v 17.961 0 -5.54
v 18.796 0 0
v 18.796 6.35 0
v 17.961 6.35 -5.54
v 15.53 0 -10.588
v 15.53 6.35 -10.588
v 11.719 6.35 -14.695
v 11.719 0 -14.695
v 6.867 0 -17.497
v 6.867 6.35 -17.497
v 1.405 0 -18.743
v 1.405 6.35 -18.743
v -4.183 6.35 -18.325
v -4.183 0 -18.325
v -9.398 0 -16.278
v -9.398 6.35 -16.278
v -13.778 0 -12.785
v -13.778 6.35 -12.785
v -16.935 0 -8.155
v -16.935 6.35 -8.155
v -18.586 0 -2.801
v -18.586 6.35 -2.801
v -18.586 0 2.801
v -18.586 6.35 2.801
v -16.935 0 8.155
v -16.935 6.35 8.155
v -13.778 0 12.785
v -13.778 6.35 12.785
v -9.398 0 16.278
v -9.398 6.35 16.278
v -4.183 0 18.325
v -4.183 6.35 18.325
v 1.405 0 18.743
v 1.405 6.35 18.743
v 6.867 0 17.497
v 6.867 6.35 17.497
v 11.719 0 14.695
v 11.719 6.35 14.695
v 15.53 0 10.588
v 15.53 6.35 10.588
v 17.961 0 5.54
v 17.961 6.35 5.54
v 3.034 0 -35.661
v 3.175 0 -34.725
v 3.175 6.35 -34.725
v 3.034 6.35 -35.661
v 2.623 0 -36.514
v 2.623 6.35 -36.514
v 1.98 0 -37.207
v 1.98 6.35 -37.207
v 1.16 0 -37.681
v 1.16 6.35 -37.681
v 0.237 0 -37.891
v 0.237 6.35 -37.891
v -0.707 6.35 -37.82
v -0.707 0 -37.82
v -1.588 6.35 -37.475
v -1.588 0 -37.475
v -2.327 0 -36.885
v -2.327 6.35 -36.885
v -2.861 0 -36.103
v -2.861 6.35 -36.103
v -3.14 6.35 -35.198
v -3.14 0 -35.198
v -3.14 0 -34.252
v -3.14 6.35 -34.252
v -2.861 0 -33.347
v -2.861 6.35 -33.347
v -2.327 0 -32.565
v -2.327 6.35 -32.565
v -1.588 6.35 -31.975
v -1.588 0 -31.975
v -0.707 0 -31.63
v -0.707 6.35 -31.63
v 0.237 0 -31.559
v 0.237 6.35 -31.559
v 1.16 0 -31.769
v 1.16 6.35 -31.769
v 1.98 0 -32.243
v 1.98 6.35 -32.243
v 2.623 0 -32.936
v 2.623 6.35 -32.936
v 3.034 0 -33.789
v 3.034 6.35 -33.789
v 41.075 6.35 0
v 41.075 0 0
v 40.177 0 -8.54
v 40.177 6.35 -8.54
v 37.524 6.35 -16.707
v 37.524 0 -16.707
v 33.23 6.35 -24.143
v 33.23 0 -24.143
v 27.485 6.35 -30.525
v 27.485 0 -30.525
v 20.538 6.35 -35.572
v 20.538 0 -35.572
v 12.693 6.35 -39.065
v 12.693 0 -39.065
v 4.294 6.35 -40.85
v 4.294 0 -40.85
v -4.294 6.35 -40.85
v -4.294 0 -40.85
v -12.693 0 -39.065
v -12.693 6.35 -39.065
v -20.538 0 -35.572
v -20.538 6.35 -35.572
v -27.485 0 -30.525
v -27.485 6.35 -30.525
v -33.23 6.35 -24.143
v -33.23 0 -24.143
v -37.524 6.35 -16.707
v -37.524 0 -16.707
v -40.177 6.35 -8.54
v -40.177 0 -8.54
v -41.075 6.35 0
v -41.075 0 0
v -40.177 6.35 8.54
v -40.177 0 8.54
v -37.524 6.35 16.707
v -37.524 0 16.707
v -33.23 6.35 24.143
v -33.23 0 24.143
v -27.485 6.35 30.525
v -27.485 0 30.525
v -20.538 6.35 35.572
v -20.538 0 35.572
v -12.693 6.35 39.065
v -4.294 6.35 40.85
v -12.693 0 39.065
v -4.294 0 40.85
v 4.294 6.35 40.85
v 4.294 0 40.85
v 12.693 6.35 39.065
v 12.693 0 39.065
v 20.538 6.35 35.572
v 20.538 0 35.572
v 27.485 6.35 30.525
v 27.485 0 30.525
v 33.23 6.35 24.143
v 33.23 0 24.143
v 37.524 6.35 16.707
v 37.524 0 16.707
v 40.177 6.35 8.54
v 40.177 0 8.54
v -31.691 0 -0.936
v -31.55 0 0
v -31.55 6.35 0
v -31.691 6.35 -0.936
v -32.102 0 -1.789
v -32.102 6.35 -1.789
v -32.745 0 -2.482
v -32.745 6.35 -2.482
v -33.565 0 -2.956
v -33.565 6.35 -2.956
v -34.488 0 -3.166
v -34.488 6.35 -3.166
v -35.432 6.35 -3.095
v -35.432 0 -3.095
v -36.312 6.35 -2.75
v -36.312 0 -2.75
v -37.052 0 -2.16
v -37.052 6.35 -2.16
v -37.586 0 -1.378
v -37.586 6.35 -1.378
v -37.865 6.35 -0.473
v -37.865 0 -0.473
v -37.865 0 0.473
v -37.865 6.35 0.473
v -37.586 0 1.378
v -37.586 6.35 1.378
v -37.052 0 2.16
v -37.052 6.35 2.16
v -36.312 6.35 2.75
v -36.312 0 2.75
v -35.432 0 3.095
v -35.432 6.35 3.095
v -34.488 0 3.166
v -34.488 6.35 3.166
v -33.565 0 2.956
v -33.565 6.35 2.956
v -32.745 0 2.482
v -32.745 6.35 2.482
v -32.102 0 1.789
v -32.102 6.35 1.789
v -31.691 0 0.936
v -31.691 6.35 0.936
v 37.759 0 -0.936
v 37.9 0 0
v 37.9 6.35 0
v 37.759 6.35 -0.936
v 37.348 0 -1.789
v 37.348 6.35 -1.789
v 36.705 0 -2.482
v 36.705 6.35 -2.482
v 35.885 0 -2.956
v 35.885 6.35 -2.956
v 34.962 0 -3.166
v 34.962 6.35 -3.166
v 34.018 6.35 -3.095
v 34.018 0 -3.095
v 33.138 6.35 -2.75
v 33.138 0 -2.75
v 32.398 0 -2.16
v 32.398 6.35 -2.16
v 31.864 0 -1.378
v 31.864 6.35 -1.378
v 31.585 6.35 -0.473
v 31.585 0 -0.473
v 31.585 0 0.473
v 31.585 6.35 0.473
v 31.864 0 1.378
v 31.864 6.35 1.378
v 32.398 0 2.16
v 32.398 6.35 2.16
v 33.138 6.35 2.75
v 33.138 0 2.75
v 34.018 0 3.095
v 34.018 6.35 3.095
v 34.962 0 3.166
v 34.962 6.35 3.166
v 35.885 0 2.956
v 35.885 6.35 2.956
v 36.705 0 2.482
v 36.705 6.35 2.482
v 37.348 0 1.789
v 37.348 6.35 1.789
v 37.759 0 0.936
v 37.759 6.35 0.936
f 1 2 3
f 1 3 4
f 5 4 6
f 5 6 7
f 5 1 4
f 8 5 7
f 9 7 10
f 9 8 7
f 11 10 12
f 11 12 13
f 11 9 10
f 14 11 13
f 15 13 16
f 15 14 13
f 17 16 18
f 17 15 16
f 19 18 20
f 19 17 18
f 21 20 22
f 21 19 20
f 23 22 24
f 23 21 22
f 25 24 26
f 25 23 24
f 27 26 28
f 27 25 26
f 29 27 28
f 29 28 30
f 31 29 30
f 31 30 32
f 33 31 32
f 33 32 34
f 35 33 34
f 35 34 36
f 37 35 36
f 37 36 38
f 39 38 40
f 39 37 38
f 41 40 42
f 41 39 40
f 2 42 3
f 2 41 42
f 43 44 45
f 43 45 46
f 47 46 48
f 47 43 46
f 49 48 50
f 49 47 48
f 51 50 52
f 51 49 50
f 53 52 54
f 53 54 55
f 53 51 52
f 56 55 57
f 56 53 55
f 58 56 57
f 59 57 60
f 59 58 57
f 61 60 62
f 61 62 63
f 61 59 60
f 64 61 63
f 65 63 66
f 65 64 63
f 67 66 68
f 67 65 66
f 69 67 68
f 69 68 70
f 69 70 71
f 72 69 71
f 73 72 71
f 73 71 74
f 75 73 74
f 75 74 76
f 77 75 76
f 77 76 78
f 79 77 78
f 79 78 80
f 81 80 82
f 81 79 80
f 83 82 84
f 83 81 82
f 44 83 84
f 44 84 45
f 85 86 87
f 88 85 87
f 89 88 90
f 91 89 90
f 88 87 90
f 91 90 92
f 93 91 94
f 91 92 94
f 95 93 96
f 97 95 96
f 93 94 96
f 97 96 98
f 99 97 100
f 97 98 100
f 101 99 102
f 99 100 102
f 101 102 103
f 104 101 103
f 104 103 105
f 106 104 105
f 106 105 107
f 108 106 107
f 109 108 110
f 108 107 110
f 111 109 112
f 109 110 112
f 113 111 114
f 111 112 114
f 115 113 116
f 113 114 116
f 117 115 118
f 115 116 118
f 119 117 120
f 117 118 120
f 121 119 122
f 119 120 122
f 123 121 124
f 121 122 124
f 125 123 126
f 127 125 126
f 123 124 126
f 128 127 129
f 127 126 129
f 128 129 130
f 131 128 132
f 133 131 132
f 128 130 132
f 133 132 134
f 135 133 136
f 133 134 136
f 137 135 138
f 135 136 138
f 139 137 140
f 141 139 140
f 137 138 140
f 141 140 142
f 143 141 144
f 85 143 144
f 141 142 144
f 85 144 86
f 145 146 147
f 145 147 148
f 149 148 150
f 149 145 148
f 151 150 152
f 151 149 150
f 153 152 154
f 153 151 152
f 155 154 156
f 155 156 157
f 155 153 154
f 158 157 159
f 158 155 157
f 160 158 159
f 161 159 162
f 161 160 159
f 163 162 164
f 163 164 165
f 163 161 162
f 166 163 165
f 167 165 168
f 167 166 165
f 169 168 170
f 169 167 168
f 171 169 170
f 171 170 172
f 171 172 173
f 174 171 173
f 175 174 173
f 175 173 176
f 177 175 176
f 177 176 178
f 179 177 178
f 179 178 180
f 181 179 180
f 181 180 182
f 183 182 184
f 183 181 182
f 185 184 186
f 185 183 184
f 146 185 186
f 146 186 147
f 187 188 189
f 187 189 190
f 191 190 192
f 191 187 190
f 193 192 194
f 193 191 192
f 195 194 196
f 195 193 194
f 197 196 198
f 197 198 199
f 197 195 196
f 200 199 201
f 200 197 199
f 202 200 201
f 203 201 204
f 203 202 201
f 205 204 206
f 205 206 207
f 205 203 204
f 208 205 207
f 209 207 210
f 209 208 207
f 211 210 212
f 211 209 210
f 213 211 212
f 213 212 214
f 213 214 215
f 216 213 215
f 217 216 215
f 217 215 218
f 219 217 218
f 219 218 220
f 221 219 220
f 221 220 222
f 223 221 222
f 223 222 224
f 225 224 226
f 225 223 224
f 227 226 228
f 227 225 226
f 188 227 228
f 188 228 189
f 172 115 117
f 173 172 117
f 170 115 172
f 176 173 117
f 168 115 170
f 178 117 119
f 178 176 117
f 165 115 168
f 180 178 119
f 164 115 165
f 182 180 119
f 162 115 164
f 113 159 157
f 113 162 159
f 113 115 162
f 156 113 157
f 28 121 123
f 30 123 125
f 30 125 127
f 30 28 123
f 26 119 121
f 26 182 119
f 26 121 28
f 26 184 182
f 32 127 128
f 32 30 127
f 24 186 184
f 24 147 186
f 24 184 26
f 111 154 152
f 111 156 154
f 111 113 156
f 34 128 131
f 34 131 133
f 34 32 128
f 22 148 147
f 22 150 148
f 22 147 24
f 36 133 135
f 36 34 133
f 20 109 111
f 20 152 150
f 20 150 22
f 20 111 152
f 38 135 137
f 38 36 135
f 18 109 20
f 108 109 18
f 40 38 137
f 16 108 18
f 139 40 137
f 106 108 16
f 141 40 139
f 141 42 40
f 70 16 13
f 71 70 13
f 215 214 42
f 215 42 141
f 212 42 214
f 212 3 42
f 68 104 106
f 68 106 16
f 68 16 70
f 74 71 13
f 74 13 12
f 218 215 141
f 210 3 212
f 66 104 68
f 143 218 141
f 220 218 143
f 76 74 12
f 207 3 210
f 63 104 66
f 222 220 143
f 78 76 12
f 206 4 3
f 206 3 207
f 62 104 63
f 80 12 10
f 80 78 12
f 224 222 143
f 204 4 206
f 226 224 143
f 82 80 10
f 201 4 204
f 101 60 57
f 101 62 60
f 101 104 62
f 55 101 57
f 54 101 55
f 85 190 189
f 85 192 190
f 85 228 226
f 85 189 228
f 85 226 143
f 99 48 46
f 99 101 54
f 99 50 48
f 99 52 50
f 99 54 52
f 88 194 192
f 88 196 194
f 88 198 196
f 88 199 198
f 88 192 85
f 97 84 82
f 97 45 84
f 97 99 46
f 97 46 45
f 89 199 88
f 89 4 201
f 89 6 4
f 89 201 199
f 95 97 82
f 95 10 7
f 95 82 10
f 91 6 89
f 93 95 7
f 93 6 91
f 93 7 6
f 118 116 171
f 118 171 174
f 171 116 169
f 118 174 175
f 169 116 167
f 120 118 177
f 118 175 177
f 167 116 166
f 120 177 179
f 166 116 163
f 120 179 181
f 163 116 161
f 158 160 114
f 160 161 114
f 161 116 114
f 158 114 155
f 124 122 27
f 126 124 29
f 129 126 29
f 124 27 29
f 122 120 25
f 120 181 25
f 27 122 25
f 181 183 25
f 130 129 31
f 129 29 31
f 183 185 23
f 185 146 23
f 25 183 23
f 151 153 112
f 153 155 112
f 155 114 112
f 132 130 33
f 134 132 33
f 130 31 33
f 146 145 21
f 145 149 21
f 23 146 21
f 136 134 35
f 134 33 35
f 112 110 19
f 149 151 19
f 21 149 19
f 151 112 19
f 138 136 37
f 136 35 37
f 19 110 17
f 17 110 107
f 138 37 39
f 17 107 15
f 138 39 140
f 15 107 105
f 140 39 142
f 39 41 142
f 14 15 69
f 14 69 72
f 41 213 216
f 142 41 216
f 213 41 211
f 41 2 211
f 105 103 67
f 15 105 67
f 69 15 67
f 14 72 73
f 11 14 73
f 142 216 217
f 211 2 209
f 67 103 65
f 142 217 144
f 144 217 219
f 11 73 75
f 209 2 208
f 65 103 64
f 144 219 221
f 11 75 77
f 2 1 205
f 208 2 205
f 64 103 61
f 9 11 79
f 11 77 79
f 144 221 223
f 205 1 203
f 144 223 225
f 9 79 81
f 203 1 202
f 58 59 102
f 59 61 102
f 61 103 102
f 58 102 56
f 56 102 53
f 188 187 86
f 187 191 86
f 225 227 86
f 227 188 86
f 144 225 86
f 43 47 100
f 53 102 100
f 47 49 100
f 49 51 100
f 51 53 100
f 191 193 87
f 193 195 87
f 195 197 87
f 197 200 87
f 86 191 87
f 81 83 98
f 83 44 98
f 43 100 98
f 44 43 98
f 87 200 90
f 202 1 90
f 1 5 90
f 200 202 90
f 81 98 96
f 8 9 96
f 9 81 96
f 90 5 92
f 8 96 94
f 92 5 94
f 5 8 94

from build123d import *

# Parameters (mm, degrees)
SKETCH1_R           = 41.075
SKETCH1_R_2         = 3.175
SKETCH1_R_3         = 18.796
BOSS_EXTRUDE2_DEPTH = 6.35


with BuildPart() as part:
    # Sketch1 → Boss-Extrude2 (new body)
    with BuildSketch(Plane(origin=(0, 0, 0), x_dir=(1, 0, 0), z_dir=(0, 1, 0))):
        Circle(SKETCH1_R)
        with Locations((0, 34.725)):
            Circle(SKETCH1_R_2, mode=Mode.SUBTRACT)
        with Locations((34.725, 0)):
            Circle(SKETCH1_R_2, mode=Mode.SUBTRACT)
        with Locations((-34.725, 0)):
            Circle(SKETCH1_R_2, mode=Mode.SUBTRACT)
        Circle(SKETCH1_R_3, mode=Mode.SUBTRACT)
    extrude(amount=BOSS_EXTRUDE2_DEPTH)


solid = part.part
